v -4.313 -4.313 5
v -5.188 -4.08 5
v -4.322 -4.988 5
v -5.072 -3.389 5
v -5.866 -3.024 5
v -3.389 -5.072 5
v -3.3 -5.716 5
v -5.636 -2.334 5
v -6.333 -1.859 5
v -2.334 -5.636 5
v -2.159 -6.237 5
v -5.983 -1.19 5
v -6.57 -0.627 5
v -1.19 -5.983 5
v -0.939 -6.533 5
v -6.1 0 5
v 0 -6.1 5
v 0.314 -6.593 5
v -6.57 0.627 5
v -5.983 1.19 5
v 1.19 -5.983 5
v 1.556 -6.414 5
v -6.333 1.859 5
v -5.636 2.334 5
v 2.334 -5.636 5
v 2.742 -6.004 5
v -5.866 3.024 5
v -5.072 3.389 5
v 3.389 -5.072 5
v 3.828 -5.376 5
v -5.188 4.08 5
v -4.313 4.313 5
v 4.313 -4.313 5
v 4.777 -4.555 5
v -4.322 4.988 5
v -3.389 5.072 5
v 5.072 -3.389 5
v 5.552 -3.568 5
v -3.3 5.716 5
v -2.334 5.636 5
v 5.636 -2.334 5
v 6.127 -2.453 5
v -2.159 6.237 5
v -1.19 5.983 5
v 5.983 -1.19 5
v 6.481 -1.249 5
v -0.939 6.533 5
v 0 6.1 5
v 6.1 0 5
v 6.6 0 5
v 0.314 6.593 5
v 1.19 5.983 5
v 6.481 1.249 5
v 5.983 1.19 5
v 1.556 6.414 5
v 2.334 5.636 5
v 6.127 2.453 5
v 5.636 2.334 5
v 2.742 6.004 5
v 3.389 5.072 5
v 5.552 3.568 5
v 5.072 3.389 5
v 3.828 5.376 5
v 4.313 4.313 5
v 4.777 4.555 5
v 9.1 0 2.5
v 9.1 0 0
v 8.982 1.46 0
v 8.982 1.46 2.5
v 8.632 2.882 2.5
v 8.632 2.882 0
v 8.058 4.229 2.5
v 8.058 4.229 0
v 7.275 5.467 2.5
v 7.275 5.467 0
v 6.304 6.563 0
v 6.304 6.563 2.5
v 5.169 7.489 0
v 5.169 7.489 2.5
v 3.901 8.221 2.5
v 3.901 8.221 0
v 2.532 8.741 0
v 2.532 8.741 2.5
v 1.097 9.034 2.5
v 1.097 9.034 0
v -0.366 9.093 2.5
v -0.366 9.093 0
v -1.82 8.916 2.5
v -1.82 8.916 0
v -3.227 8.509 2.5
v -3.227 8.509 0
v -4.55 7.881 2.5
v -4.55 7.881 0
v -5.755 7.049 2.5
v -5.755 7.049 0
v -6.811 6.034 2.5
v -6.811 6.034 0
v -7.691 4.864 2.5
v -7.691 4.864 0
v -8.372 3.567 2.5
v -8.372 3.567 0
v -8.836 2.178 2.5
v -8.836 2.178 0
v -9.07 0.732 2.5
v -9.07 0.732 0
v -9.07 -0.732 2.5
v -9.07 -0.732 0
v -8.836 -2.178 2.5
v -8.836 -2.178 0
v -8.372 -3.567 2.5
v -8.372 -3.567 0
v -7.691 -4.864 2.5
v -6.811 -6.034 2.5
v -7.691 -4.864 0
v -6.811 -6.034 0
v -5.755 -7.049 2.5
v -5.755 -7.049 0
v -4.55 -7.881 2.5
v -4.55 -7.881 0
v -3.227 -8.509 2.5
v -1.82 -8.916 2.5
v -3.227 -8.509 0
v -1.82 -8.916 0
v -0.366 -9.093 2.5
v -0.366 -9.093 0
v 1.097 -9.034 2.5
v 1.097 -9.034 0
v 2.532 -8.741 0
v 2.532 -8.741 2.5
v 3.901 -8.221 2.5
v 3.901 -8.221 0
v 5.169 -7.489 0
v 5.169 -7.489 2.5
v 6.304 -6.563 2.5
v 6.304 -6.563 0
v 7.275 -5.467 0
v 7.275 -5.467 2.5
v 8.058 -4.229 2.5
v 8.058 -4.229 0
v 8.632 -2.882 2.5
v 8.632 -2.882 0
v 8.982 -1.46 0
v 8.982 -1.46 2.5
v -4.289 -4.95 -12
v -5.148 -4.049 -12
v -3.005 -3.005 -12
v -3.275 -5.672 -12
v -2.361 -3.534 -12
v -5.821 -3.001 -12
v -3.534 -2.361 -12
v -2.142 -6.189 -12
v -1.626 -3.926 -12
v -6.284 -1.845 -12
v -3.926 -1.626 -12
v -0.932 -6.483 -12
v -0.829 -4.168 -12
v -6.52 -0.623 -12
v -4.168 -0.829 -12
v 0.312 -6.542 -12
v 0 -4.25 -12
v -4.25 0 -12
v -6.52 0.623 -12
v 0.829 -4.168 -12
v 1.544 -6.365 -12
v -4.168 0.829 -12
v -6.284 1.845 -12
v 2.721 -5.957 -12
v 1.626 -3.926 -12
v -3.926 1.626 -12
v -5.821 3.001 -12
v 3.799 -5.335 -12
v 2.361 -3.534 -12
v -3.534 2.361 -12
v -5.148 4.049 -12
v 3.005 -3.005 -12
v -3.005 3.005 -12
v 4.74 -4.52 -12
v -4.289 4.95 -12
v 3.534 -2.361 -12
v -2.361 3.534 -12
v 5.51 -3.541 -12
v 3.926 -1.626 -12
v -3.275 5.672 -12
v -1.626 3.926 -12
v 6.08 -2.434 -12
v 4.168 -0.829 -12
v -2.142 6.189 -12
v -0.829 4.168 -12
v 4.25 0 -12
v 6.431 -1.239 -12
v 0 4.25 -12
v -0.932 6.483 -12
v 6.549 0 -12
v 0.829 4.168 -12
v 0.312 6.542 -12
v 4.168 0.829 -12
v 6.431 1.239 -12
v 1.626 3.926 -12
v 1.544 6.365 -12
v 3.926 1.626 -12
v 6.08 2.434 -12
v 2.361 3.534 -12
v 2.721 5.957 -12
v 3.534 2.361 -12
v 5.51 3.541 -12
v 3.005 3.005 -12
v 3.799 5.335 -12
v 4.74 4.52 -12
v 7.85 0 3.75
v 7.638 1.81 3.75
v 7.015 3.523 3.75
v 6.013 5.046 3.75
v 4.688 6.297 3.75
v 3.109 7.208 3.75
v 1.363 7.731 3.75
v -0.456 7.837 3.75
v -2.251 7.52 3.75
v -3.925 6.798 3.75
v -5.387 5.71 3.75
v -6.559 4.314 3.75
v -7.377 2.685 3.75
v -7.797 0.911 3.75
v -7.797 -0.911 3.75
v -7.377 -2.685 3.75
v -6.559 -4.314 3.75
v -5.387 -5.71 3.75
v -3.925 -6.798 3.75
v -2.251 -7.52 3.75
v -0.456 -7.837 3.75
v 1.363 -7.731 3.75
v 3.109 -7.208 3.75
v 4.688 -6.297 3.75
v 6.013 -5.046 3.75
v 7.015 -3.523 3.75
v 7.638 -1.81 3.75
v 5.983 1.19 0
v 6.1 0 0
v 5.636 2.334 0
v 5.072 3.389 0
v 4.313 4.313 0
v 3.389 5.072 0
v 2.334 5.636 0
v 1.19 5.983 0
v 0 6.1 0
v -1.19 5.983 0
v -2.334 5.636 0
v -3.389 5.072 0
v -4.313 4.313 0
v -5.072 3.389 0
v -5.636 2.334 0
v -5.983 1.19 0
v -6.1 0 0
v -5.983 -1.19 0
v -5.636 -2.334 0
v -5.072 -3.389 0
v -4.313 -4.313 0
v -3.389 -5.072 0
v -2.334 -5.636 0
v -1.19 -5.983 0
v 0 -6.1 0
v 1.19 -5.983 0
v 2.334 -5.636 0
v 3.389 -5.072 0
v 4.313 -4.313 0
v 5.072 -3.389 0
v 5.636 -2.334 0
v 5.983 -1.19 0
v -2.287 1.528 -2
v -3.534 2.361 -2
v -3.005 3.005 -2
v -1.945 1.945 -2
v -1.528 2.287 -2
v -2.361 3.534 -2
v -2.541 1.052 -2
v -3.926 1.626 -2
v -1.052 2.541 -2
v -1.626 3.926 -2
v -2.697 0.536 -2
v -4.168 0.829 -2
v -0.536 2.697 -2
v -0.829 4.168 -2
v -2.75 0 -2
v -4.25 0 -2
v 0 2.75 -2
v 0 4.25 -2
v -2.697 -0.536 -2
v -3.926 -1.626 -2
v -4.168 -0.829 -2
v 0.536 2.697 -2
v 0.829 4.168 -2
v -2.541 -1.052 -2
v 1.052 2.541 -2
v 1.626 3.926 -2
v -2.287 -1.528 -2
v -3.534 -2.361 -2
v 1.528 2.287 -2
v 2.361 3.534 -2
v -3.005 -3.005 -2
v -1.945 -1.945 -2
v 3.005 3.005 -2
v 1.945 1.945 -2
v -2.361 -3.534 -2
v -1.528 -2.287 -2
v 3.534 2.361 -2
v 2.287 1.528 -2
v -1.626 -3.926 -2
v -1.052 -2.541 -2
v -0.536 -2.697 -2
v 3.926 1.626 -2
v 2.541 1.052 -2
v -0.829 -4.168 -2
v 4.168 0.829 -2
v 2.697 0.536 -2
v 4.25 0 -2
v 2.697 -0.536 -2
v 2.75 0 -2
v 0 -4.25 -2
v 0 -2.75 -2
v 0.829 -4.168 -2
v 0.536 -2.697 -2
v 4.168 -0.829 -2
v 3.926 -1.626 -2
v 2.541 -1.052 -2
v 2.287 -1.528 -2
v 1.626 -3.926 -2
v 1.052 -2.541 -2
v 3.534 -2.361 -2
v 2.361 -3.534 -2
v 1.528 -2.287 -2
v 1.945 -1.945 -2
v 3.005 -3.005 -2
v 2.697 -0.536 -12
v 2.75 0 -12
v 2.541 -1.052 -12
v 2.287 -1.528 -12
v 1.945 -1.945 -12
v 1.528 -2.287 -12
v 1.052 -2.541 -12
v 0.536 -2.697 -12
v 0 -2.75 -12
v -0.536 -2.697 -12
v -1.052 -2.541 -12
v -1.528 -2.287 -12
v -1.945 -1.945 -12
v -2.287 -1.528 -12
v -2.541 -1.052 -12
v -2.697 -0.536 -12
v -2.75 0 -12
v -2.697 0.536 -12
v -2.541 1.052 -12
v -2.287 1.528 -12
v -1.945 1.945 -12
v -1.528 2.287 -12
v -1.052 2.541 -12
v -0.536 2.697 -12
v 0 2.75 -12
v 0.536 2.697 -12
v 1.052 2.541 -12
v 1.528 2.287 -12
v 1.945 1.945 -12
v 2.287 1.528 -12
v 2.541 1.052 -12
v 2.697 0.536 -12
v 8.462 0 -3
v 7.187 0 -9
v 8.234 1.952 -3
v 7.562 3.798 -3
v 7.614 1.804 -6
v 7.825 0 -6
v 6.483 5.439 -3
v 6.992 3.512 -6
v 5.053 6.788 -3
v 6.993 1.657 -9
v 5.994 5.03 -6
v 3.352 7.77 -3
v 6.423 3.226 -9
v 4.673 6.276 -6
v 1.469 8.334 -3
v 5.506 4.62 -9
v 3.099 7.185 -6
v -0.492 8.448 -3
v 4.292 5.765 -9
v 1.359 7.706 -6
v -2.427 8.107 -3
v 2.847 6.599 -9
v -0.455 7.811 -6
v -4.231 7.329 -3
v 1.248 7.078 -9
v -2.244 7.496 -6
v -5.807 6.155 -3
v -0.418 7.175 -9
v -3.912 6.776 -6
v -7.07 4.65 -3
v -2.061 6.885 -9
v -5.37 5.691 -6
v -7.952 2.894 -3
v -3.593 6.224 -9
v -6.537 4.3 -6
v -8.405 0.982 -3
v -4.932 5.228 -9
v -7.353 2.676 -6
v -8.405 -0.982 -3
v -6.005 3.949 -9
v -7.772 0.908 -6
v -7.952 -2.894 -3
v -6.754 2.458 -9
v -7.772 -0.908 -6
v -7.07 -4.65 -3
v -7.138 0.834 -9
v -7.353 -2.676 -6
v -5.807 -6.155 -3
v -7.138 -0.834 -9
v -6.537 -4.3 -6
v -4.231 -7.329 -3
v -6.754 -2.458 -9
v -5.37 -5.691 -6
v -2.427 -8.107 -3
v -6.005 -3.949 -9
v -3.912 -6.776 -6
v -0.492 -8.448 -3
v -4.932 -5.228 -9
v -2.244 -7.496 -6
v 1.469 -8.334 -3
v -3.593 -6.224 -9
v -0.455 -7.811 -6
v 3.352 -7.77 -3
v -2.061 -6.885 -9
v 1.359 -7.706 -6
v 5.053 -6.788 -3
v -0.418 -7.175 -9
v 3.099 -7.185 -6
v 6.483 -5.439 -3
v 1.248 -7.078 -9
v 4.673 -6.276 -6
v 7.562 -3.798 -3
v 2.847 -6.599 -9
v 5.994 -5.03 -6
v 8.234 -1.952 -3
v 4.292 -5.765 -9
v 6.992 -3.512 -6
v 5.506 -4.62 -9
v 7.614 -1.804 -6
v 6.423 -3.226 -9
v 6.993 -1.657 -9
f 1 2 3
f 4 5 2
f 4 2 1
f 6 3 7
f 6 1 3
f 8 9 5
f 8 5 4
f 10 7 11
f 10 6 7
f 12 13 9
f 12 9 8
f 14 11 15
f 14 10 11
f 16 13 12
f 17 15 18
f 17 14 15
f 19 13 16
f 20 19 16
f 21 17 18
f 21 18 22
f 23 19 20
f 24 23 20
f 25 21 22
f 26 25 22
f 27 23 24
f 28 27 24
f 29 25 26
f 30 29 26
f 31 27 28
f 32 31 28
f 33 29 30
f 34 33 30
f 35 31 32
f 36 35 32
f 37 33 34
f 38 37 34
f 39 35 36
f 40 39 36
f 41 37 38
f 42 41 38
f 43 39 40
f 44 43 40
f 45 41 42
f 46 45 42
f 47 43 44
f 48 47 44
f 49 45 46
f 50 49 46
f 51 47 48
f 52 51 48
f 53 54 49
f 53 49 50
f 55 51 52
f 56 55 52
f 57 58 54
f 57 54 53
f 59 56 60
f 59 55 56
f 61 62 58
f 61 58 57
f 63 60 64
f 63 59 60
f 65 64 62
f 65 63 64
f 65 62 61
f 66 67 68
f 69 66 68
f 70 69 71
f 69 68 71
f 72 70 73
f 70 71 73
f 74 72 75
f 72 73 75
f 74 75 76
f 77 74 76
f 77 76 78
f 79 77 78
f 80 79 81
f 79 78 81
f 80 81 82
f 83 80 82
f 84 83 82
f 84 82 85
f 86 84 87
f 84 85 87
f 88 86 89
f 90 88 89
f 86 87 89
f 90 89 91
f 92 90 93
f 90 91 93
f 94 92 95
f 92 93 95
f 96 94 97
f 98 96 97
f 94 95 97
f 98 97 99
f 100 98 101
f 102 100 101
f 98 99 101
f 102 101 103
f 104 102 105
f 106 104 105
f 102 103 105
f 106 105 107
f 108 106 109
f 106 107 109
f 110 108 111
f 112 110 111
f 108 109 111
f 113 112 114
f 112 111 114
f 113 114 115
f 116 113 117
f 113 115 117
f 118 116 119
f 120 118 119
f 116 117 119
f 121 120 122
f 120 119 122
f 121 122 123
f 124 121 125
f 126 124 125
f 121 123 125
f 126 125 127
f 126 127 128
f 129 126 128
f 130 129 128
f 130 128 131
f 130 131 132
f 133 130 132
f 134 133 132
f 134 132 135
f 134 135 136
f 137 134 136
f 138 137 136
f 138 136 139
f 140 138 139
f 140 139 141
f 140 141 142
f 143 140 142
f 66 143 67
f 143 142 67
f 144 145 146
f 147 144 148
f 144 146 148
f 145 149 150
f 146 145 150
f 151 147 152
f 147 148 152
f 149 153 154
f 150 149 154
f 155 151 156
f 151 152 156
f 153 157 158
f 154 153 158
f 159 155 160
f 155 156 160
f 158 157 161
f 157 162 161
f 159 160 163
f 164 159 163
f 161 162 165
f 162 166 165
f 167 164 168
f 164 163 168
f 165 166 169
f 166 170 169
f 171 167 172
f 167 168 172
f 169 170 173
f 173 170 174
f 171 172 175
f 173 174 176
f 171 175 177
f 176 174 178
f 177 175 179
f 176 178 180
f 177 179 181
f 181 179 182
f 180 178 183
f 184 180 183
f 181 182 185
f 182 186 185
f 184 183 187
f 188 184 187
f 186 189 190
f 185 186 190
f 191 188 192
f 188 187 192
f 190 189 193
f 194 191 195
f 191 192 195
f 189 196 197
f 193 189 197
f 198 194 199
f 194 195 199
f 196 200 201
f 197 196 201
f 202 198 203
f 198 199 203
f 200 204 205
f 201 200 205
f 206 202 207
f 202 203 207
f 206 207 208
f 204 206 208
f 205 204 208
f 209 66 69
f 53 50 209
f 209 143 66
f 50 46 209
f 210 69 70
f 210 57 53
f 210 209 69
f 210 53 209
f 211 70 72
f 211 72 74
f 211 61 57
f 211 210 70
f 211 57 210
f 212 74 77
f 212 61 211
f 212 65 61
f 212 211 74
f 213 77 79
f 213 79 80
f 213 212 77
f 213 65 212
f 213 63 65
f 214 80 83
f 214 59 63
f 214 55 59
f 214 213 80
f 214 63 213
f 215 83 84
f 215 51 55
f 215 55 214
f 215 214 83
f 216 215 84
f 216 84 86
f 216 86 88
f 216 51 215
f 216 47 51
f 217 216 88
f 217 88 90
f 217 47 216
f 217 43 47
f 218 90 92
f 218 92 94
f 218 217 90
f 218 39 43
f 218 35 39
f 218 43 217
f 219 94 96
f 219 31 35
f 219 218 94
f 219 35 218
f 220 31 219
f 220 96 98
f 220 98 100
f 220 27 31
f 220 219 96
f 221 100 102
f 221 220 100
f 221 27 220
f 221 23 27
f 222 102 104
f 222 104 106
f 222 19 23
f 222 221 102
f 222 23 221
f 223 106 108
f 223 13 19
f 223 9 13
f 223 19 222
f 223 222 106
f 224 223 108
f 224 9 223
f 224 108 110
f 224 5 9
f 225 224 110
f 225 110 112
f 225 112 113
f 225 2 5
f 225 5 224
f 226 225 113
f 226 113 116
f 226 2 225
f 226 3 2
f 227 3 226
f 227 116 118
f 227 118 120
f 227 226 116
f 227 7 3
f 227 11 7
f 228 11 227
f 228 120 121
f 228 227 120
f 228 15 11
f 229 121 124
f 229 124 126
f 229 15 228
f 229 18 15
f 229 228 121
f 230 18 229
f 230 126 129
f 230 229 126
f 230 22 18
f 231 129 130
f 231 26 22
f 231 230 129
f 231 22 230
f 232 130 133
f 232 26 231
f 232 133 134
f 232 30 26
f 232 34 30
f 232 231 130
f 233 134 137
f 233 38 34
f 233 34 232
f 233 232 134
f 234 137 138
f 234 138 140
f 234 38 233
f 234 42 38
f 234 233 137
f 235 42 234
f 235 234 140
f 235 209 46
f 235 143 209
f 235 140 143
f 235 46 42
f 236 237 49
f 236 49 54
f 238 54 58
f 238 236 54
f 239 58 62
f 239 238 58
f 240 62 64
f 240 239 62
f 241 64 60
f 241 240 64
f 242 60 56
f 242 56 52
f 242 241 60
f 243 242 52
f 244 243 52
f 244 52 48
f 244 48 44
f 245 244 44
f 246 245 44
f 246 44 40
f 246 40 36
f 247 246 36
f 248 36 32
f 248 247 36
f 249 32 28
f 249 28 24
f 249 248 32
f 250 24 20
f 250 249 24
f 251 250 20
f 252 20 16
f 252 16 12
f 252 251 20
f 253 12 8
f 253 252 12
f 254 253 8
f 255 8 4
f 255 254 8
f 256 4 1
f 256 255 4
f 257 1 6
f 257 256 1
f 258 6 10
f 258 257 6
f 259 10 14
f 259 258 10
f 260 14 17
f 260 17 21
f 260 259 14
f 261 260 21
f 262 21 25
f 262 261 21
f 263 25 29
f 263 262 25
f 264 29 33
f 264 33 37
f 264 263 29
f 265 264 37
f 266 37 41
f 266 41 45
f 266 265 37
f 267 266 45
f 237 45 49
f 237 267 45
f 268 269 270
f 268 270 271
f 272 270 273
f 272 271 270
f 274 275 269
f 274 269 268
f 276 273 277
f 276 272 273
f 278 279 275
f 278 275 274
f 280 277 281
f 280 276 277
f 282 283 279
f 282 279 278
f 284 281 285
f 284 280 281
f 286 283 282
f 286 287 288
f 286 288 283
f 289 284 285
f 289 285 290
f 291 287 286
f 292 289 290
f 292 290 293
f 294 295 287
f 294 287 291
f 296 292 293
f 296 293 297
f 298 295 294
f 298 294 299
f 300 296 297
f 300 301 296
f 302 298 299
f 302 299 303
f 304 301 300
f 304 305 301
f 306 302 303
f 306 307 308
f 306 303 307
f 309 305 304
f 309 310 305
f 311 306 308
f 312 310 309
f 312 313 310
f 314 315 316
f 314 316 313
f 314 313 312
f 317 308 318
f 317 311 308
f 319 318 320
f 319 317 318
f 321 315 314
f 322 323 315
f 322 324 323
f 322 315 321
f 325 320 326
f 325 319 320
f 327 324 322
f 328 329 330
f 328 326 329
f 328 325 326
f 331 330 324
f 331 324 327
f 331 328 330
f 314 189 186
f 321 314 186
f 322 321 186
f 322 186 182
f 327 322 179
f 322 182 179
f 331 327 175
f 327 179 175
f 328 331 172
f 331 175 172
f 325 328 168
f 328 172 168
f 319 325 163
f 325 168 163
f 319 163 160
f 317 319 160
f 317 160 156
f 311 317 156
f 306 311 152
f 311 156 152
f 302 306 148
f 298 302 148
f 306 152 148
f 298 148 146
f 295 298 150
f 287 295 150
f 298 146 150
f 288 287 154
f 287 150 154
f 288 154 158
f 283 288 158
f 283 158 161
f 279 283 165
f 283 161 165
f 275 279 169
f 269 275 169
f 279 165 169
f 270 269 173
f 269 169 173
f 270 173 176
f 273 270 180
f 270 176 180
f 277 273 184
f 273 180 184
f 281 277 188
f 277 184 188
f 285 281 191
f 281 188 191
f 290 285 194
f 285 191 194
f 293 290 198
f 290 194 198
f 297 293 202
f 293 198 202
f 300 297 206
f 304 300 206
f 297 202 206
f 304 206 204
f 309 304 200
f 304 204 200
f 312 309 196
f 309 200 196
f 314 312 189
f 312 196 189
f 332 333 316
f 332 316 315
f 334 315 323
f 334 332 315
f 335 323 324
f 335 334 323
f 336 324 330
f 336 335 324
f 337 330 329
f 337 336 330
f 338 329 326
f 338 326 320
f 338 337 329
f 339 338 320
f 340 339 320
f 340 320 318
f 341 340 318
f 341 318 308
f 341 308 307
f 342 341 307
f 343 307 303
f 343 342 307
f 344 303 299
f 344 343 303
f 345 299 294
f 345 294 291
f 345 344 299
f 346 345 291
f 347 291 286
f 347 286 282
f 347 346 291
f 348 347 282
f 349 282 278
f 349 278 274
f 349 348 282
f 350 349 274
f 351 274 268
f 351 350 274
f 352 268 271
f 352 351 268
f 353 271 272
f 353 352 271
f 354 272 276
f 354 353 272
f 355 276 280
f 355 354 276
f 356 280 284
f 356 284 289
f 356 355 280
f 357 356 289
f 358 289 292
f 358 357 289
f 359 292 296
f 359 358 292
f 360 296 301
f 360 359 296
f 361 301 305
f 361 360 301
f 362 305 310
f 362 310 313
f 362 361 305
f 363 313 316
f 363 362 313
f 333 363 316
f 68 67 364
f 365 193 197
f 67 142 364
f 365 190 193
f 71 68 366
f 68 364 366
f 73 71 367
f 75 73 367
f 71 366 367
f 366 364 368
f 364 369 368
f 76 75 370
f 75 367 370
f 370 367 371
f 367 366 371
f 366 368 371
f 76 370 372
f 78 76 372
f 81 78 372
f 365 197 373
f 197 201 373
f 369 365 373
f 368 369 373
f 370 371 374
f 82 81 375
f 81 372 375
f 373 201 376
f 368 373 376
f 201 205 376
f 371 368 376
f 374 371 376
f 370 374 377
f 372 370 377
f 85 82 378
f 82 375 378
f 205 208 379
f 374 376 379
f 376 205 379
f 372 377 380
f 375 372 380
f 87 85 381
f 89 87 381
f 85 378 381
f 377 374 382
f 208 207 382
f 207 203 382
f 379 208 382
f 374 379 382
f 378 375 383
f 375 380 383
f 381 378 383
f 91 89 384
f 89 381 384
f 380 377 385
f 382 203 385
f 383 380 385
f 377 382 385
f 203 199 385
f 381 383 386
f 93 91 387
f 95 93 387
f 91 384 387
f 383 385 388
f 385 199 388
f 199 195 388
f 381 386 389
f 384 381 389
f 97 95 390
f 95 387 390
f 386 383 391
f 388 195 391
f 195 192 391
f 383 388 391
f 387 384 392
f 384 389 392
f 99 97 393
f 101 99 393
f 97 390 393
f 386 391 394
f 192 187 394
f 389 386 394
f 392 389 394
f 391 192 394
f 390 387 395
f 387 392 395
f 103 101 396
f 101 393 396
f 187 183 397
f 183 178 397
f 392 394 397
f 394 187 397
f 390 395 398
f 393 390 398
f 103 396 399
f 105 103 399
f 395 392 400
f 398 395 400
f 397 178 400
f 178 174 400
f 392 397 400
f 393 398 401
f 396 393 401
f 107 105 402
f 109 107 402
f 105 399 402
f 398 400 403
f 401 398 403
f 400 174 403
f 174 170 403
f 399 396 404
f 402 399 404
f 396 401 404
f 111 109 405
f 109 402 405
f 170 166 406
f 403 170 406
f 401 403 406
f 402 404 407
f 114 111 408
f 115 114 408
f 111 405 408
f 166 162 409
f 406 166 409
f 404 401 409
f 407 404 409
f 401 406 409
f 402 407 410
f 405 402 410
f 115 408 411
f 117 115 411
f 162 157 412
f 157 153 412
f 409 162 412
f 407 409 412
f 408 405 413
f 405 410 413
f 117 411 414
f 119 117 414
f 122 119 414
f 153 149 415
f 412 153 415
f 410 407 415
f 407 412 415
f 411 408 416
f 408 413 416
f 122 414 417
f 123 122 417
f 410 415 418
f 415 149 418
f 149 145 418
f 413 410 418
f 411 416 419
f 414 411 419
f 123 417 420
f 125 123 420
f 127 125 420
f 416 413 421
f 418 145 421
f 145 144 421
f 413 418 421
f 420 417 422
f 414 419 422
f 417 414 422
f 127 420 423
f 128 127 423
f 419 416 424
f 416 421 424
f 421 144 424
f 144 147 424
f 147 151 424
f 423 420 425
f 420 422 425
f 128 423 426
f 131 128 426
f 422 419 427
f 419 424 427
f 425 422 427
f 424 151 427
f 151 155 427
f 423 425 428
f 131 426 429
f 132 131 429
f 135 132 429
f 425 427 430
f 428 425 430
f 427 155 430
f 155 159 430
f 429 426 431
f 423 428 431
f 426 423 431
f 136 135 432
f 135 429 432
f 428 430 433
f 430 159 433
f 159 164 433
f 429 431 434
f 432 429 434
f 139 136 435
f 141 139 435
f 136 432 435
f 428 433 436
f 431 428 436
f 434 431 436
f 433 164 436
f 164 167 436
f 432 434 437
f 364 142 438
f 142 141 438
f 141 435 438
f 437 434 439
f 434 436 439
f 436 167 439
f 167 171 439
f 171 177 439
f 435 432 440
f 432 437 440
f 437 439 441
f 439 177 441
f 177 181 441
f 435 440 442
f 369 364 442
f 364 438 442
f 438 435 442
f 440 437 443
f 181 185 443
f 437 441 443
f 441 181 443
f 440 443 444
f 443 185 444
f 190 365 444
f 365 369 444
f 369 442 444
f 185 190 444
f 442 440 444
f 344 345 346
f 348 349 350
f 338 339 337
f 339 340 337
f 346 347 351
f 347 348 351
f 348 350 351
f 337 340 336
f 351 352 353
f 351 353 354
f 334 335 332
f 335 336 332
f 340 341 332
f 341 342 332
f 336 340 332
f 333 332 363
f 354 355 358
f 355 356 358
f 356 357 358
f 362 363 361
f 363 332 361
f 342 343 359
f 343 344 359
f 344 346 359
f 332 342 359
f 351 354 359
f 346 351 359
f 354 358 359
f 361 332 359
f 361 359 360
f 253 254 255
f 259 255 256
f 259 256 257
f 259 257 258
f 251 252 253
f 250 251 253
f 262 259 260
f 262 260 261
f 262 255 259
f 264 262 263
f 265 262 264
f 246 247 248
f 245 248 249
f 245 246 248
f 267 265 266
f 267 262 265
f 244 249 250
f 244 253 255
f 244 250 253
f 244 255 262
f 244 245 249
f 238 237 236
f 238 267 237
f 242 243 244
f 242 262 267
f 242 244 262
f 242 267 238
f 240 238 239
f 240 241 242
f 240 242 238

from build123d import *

# Parameters (mm, degrees)
F1_R     = 9.1
F1_R_2   = 6.1
F2_DEPTH = 5
F3_DEPTH = 12
F3_TAPER = 12
F4_R     = 4.25
F4_R_2   = 2.75
F5_DEPTH = 10
F6_SIZE  = 2.5


with BuildPart() as f2:
    # F1 (on Top) → F2 (new body)
    with BuildSketch(Plane.XY):
        Circle(F1_R)
        Circle(F1_R_2, mode=Mode.SUBTRACT)
    extrude(amount=F2_DEPTH)

    # F1 (on Top) → F3 (join)
    with BuildSketch(Plane.XY):
        Circle(F1_R)
        Circle(F1_R_2, mode=Mode.SUBTRACT)
        Circle(F1_R_2)
    extrude(amount=-F3_DEPTH, taper=F3_TAPER)

    # F4 (on face) → F5 (cut)
    with BuildSketch(Plane(origin=(0, 0, -12), x_dir=(1, 0, 0), z_dir=(0, 0, -1))):
        Circle(F4_R)
        Circle(F4_R_2, mode=Mode.SUBTRACT)
    extrude(amount=-F5_DEPTH, mode=Mode.SUBTRACT)

    # F6
    f6_edges = [f2.edges().sort_by_distance(p)[0] for p in [
        (-9.1, 0, 5),
    ]]
    chamfer(f6_edges, length=F6_SIZE)


solid = f2.part
